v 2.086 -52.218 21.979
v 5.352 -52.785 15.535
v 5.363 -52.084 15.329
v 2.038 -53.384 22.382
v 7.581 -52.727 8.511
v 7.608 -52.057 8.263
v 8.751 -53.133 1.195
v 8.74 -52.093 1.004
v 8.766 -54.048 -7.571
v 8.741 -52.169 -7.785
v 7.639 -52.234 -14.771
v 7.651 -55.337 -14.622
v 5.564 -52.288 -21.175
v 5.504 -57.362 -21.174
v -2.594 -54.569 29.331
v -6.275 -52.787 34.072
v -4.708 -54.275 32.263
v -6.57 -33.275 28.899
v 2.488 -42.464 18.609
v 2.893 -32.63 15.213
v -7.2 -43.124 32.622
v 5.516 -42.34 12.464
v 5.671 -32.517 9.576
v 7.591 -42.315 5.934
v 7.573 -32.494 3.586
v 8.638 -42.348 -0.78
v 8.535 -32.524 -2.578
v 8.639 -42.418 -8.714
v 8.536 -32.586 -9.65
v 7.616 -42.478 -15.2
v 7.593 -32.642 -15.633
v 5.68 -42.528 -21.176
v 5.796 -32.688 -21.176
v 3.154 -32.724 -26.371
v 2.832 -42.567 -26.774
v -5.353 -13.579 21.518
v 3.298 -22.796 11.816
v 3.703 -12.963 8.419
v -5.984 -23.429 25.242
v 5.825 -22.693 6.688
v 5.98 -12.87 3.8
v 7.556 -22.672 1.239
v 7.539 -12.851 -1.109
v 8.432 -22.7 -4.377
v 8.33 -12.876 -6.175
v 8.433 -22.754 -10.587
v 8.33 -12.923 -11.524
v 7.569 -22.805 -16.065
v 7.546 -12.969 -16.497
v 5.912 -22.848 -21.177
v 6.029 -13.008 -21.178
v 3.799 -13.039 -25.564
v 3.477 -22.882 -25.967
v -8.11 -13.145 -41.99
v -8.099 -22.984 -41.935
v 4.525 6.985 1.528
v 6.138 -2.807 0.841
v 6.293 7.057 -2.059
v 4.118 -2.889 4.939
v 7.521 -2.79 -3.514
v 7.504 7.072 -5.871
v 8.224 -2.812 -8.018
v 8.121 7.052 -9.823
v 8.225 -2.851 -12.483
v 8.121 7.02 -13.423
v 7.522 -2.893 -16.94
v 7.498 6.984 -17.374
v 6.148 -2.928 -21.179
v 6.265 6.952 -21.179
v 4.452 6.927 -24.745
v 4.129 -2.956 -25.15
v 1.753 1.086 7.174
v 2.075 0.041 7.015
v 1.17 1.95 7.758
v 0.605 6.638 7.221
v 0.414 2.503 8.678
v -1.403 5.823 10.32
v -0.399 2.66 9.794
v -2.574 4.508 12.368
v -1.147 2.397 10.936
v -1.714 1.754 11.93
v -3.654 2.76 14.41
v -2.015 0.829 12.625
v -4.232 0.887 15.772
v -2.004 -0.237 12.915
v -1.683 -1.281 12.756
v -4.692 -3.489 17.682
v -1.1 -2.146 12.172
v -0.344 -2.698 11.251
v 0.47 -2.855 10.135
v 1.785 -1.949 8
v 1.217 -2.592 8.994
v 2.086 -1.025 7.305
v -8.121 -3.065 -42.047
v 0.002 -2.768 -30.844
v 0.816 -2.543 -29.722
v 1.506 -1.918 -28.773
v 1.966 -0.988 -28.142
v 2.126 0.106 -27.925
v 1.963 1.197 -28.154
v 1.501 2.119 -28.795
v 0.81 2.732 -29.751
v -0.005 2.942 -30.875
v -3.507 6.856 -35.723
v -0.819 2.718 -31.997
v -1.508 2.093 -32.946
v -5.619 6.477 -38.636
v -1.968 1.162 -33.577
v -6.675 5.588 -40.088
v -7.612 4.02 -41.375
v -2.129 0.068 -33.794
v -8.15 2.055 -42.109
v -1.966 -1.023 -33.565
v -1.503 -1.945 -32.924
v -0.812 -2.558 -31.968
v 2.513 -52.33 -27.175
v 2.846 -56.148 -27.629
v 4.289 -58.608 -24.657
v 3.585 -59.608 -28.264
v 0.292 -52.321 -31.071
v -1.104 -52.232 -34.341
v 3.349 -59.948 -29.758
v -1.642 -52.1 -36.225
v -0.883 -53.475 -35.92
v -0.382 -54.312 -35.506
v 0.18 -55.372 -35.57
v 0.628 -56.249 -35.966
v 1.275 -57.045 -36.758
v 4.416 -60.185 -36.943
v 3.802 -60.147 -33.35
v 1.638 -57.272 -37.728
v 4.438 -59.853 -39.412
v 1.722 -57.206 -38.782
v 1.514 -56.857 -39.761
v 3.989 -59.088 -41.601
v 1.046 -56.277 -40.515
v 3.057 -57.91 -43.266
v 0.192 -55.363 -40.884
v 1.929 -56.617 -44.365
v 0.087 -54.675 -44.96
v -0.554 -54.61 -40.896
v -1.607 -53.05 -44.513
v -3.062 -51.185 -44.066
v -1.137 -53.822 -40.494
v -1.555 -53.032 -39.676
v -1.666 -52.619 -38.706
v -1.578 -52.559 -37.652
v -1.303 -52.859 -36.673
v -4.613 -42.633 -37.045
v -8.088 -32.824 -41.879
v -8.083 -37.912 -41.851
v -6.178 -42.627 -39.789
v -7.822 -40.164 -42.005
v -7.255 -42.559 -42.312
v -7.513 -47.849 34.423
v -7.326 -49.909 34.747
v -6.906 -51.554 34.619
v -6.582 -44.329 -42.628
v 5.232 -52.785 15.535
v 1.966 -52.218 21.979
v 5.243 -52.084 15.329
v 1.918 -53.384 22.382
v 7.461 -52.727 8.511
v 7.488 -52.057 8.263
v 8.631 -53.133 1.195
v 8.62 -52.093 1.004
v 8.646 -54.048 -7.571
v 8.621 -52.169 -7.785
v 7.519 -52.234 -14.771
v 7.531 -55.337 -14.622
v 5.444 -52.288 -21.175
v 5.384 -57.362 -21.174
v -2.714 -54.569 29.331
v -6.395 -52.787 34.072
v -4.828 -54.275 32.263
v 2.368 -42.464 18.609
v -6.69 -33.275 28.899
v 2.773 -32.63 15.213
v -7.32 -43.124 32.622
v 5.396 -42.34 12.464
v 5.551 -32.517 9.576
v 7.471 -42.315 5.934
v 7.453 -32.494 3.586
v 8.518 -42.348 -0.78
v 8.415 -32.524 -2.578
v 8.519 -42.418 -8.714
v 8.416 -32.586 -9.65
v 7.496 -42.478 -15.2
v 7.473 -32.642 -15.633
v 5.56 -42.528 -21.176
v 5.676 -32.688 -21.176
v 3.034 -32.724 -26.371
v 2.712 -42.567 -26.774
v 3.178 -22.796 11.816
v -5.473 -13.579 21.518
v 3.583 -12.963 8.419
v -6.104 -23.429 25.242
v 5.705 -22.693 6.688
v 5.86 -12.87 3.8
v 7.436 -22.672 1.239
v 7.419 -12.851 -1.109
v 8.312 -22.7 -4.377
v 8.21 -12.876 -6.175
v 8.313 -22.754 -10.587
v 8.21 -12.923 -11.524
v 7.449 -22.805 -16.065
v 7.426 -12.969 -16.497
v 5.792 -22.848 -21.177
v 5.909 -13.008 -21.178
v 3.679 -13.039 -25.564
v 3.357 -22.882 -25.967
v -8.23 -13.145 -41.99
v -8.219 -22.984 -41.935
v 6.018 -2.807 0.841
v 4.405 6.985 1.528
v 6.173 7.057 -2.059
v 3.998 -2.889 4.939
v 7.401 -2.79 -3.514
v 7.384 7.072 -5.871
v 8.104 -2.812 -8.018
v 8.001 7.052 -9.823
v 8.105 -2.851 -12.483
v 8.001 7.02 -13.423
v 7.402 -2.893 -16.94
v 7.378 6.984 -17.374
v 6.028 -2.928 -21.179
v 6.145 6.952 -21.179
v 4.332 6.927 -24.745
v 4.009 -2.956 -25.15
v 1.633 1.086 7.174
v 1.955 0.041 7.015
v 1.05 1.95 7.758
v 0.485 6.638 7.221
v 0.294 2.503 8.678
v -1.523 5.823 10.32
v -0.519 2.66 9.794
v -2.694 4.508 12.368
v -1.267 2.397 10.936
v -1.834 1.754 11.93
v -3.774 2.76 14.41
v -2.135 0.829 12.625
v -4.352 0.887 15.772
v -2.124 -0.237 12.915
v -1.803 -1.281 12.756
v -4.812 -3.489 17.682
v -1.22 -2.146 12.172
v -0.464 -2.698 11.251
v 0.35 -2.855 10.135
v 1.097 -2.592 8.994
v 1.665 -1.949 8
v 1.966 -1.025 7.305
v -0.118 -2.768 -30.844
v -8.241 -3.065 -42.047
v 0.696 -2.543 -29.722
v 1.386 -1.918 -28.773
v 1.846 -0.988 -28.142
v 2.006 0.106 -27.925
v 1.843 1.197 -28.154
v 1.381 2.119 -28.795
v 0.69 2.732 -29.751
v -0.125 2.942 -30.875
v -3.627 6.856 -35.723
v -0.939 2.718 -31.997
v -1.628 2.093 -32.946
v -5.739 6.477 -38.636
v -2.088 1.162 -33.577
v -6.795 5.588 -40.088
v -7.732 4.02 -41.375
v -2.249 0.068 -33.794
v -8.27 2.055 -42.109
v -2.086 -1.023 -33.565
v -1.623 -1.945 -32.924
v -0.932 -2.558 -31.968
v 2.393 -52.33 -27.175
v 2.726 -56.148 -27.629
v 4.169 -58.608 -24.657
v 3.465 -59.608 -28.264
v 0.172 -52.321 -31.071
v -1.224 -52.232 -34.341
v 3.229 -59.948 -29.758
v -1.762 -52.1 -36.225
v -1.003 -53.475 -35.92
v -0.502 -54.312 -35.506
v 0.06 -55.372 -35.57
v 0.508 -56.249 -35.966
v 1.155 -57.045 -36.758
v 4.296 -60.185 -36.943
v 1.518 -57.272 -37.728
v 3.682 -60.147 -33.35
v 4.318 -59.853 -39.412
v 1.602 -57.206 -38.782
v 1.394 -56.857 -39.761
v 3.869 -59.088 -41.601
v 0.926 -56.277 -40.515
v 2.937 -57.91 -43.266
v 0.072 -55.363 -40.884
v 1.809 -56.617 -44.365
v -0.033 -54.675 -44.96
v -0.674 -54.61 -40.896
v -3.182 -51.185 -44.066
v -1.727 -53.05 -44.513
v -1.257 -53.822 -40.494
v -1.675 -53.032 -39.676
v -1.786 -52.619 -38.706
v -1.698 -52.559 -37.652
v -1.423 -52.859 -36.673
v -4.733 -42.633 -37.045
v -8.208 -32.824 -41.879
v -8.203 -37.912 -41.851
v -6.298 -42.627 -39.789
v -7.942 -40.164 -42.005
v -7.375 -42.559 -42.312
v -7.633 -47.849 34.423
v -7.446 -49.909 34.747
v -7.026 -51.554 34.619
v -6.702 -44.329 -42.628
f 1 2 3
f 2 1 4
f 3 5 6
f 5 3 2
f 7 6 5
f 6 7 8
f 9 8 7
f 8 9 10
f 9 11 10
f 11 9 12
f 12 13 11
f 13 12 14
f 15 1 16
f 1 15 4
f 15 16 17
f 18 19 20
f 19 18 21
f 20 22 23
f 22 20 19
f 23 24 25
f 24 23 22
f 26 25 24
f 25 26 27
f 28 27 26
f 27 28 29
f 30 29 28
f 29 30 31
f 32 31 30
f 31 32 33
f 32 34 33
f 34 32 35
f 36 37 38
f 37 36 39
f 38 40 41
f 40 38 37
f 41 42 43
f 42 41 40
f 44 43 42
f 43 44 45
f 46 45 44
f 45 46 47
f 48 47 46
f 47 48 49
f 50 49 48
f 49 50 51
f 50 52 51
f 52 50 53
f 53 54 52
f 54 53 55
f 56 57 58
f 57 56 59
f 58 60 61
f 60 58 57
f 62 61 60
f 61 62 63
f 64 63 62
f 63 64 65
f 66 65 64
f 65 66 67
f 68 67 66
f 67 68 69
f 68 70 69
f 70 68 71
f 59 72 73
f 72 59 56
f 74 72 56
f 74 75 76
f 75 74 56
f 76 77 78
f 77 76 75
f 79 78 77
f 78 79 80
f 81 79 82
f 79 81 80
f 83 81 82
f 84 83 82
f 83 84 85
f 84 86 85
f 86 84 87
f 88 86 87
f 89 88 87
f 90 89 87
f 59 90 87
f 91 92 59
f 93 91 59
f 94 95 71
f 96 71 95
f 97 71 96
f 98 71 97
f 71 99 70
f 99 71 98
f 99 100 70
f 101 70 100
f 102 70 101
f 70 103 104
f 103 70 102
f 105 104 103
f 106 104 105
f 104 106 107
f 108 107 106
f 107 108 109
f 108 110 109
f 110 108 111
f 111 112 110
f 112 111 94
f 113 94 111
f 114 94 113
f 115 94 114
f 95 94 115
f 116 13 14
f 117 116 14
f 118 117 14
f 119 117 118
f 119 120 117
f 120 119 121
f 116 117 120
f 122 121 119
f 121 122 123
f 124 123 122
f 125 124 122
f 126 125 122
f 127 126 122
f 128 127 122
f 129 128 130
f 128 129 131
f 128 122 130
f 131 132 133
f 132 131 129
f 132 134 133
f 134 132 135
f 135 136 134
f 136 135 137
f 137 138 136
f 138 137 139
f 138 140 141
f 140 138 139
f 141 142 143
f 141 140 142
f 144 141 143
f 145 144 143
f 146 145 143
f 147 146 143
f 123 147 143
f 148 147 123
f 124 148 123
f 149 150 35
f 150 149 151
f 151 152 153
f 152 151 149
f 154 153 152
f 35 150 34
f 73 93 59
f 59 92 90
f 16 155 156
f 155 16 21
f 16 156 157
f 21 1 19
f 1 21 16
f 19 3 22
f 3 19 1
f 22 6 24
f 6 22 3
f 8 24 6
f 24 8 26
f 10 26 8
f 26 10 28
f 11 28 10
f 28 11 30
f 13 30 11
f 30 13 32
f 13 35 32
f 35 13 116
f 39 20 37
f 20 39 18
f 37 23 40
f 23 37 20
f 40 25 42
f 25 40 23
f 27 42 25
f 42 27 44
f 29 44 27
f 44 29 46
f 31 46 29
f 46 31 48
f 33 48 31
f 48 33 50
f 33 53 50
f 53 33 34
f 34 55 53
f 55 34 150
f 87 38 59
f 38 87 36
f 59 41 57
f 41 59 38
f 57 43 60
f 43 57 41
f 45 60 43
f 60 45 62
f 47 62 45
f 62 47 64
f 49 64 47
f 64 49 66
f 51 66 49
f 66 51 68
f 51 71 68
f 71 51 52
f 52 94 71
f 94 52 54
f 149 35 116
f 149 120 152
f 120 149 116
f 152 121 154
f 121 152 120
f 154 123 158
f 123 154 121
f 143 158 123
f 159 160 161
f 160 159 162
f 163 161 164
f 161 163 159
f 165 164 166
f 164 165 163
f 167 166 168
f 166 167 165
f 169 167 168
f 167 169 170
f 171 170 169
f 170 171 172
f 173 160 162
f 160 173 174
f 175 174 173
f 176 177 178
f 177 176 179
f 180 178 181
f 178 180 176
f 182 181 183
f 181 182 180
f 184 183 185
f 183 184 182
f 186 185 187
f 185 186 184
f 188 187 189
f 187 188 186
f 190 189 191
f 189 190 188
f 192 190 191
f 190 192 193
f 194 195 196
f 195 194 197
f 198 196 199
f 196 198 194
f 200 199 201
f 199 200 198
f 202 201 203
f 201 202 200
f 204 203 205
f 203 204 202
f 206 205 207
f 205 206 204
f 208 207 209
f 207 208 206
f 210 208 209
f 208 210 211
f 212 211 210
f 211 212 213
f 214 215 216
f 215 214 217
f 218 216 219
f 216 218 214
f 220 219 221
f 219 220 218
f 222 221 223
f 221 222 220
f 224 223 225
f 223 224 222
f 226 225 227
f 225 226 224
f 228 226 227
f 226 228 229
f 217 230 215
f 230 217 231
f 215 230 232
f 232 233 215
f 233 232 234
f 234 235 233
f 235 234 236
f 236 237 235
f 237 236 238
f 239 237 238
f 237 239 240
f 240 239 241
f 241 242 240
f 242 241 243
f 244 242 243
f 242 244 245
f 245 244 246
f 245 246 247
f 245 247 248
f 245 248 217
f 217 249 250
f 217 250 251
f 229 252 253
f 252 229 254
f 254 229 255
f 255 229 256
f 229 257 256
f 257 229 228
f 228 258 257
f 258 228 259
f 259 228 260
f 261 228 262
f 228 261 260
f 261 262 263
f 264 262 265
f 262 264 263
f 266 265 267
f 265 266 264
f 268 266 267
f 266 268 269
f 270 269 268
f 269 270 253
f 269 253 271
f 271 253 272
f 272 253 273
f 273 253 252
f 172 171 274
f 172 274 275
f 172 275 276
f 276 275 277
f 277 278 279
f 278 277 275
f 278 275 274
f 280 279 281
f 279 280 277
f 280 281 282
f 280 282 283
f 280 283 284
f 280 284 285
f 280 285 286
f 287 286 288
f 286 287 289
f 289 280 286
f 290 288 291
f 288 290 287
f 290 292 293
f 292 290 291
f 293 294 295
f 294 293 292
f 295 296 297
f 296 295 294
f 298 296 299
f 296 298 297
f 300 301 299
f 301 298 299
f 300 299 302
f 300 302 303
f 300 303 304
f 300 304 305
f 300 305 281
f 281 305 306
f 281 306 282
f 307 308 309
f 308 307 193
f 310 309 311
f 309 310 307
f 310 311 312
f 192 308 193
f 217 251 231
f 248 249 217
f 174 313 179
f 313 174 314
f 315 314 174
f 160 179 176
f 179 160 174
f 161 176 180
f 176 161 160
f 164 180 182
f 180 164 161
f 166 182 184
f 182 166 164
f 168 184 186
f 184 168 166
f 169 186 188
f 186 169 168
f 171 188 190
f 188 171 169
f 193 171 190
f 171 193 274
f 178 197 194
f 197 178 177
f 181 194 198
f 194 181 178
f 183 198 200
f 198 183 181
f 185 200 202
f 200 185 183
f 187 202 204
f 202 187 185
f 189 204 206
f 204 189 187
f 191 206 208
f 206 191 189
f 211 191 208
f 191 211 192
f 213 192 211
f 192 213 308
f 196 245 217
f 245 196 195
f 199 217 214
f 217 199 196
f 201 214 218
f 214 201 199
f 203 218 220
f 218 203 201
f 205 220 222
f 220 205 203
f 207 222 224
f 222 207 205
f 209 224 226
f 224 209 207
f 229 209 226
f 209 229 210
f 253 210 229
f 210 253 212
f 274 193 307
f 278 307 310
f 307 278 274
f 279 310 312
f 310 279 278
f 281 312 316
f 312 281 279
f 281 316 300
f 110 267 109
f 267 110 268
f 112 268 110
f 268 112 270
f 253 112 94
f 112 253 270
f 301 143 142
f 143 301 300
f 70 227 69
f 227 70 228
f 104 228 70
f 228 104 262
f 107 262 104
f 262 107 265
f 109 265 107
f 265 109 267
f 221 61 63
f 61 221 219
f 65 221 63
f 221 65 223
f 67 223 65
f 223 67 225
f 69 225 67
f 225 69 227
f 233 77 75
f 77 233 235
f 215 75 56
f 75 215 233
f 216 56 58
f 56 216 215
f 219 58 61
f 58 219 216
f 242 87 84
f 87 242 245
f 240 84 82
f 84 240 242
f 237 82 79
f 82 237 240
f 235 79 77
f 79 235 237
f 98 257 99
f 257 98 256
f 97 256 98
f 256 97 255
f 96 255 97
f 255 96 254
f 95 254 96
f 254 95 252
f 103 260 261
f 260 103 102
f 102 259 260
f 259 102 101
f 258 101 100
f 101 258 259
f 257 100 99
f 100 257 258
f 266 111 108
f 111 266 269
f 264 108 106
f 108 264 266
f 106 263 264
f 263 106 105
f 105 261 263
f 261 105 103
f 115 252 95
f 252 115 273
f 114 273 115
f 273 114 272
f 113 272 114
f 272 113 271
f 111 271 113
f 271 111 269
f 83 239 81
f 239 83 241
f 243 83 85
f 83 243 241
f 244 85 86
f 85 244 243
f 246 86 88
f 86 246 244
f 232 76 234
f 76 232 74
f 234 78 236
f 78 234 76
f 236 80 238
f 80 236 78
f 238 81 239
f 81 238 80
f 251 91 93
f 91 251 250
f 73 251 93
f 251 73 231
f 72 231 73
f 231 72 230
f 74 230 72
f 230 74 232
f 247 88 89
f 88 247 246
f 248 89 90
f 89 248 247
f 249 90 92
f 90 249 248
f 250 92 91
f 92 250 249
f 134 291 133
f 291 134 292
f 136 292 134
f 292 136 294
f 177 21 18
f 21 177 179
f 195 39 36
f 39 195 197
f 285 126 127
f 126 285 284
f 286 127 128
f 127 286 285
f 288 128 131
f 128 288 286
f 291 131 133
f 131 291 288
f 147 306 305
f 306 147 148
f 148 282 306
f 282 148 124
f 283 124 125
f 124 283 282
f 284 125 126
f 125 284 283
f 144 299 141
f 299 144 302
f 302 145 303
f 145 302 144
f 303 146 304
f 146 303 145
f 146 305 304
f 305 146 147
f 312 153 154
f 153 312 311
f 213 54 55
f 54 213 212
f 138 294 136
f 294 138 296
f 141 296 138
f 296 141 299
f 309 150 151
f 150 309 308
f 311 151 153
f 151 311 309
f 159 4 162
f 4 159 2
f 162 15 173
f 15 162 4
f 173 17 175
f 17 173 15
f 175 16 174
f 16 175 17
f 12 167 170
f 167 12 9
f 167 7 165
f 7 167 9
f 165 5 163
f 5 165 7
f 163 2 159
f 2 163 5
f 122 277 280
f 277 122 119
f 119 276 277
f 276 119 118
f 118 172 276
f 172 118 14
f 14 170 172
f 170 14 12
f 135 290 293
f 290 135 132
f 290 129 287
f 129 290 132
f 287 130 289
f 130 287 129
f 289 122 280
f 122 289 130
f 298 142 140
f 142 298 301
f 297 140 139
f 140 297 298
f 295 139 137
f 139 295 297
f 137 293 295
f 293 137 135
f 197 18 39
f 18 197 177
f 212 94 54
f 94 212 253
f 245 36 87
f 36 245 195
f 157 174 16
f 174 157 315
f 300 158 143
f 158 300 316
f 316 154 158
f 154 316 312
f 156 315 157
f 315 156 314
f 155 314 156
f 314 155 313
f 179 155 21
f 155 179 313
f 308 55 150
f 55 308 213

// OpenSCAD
use <../lib.scad>
use <u768c01.scad>
function ldraw_lib__u768c02() = [
// 0 Sail 11 x  9 Trapezoidal (Formed Shape 2)
// 0 Name: u768c02.dat
// 0 Author: Philippe Hurbain [Philo]
// 0 !LDRAW_ORG Part UPDATE 2024-05
// 0 !LICENSE Licensed under CC BY 4.0 : see CAreadme.txt
// 
// 0 !HELP Placement on mast:
// 0 !HELP 1 25 0 100 0 1 0 0 0 1 0 0 0 1 4318.dat
// 0 !HELP 1 25 0 92 -24 -1 0 0 0 1 0 0 0 -1 4319.dat
// 
// 0 BFC CERTIFY CCW
  [0,"BFC","CERTIFY"],
  [0,"BFC","CCW"],
// 
// 0 !CATEGORY Sheet Fabric
// 
// 0 !HISTORY 2024-06-30 [OrionP] Official Update 2024-05
// 
// 
// 1 16 0 0 0 -1 0 0 0 1 0 0 0 1 u768c01.dat
  [1,16,0,0,0,-1,0,0,0,1,0,0,0,1, ldraw_lib__u768c01()],
];
module ldraw_lib__u768c02(step=0, col=false, unit=2/5, alt=false, line=0.2, solid=!$preview)
    makepoly(ldraw_lib__u768c02(), step=step, col=col, unit=unit, alt=alt, line=line, solid=solid);
ldraw_lib__u768c02(line=0.2);
